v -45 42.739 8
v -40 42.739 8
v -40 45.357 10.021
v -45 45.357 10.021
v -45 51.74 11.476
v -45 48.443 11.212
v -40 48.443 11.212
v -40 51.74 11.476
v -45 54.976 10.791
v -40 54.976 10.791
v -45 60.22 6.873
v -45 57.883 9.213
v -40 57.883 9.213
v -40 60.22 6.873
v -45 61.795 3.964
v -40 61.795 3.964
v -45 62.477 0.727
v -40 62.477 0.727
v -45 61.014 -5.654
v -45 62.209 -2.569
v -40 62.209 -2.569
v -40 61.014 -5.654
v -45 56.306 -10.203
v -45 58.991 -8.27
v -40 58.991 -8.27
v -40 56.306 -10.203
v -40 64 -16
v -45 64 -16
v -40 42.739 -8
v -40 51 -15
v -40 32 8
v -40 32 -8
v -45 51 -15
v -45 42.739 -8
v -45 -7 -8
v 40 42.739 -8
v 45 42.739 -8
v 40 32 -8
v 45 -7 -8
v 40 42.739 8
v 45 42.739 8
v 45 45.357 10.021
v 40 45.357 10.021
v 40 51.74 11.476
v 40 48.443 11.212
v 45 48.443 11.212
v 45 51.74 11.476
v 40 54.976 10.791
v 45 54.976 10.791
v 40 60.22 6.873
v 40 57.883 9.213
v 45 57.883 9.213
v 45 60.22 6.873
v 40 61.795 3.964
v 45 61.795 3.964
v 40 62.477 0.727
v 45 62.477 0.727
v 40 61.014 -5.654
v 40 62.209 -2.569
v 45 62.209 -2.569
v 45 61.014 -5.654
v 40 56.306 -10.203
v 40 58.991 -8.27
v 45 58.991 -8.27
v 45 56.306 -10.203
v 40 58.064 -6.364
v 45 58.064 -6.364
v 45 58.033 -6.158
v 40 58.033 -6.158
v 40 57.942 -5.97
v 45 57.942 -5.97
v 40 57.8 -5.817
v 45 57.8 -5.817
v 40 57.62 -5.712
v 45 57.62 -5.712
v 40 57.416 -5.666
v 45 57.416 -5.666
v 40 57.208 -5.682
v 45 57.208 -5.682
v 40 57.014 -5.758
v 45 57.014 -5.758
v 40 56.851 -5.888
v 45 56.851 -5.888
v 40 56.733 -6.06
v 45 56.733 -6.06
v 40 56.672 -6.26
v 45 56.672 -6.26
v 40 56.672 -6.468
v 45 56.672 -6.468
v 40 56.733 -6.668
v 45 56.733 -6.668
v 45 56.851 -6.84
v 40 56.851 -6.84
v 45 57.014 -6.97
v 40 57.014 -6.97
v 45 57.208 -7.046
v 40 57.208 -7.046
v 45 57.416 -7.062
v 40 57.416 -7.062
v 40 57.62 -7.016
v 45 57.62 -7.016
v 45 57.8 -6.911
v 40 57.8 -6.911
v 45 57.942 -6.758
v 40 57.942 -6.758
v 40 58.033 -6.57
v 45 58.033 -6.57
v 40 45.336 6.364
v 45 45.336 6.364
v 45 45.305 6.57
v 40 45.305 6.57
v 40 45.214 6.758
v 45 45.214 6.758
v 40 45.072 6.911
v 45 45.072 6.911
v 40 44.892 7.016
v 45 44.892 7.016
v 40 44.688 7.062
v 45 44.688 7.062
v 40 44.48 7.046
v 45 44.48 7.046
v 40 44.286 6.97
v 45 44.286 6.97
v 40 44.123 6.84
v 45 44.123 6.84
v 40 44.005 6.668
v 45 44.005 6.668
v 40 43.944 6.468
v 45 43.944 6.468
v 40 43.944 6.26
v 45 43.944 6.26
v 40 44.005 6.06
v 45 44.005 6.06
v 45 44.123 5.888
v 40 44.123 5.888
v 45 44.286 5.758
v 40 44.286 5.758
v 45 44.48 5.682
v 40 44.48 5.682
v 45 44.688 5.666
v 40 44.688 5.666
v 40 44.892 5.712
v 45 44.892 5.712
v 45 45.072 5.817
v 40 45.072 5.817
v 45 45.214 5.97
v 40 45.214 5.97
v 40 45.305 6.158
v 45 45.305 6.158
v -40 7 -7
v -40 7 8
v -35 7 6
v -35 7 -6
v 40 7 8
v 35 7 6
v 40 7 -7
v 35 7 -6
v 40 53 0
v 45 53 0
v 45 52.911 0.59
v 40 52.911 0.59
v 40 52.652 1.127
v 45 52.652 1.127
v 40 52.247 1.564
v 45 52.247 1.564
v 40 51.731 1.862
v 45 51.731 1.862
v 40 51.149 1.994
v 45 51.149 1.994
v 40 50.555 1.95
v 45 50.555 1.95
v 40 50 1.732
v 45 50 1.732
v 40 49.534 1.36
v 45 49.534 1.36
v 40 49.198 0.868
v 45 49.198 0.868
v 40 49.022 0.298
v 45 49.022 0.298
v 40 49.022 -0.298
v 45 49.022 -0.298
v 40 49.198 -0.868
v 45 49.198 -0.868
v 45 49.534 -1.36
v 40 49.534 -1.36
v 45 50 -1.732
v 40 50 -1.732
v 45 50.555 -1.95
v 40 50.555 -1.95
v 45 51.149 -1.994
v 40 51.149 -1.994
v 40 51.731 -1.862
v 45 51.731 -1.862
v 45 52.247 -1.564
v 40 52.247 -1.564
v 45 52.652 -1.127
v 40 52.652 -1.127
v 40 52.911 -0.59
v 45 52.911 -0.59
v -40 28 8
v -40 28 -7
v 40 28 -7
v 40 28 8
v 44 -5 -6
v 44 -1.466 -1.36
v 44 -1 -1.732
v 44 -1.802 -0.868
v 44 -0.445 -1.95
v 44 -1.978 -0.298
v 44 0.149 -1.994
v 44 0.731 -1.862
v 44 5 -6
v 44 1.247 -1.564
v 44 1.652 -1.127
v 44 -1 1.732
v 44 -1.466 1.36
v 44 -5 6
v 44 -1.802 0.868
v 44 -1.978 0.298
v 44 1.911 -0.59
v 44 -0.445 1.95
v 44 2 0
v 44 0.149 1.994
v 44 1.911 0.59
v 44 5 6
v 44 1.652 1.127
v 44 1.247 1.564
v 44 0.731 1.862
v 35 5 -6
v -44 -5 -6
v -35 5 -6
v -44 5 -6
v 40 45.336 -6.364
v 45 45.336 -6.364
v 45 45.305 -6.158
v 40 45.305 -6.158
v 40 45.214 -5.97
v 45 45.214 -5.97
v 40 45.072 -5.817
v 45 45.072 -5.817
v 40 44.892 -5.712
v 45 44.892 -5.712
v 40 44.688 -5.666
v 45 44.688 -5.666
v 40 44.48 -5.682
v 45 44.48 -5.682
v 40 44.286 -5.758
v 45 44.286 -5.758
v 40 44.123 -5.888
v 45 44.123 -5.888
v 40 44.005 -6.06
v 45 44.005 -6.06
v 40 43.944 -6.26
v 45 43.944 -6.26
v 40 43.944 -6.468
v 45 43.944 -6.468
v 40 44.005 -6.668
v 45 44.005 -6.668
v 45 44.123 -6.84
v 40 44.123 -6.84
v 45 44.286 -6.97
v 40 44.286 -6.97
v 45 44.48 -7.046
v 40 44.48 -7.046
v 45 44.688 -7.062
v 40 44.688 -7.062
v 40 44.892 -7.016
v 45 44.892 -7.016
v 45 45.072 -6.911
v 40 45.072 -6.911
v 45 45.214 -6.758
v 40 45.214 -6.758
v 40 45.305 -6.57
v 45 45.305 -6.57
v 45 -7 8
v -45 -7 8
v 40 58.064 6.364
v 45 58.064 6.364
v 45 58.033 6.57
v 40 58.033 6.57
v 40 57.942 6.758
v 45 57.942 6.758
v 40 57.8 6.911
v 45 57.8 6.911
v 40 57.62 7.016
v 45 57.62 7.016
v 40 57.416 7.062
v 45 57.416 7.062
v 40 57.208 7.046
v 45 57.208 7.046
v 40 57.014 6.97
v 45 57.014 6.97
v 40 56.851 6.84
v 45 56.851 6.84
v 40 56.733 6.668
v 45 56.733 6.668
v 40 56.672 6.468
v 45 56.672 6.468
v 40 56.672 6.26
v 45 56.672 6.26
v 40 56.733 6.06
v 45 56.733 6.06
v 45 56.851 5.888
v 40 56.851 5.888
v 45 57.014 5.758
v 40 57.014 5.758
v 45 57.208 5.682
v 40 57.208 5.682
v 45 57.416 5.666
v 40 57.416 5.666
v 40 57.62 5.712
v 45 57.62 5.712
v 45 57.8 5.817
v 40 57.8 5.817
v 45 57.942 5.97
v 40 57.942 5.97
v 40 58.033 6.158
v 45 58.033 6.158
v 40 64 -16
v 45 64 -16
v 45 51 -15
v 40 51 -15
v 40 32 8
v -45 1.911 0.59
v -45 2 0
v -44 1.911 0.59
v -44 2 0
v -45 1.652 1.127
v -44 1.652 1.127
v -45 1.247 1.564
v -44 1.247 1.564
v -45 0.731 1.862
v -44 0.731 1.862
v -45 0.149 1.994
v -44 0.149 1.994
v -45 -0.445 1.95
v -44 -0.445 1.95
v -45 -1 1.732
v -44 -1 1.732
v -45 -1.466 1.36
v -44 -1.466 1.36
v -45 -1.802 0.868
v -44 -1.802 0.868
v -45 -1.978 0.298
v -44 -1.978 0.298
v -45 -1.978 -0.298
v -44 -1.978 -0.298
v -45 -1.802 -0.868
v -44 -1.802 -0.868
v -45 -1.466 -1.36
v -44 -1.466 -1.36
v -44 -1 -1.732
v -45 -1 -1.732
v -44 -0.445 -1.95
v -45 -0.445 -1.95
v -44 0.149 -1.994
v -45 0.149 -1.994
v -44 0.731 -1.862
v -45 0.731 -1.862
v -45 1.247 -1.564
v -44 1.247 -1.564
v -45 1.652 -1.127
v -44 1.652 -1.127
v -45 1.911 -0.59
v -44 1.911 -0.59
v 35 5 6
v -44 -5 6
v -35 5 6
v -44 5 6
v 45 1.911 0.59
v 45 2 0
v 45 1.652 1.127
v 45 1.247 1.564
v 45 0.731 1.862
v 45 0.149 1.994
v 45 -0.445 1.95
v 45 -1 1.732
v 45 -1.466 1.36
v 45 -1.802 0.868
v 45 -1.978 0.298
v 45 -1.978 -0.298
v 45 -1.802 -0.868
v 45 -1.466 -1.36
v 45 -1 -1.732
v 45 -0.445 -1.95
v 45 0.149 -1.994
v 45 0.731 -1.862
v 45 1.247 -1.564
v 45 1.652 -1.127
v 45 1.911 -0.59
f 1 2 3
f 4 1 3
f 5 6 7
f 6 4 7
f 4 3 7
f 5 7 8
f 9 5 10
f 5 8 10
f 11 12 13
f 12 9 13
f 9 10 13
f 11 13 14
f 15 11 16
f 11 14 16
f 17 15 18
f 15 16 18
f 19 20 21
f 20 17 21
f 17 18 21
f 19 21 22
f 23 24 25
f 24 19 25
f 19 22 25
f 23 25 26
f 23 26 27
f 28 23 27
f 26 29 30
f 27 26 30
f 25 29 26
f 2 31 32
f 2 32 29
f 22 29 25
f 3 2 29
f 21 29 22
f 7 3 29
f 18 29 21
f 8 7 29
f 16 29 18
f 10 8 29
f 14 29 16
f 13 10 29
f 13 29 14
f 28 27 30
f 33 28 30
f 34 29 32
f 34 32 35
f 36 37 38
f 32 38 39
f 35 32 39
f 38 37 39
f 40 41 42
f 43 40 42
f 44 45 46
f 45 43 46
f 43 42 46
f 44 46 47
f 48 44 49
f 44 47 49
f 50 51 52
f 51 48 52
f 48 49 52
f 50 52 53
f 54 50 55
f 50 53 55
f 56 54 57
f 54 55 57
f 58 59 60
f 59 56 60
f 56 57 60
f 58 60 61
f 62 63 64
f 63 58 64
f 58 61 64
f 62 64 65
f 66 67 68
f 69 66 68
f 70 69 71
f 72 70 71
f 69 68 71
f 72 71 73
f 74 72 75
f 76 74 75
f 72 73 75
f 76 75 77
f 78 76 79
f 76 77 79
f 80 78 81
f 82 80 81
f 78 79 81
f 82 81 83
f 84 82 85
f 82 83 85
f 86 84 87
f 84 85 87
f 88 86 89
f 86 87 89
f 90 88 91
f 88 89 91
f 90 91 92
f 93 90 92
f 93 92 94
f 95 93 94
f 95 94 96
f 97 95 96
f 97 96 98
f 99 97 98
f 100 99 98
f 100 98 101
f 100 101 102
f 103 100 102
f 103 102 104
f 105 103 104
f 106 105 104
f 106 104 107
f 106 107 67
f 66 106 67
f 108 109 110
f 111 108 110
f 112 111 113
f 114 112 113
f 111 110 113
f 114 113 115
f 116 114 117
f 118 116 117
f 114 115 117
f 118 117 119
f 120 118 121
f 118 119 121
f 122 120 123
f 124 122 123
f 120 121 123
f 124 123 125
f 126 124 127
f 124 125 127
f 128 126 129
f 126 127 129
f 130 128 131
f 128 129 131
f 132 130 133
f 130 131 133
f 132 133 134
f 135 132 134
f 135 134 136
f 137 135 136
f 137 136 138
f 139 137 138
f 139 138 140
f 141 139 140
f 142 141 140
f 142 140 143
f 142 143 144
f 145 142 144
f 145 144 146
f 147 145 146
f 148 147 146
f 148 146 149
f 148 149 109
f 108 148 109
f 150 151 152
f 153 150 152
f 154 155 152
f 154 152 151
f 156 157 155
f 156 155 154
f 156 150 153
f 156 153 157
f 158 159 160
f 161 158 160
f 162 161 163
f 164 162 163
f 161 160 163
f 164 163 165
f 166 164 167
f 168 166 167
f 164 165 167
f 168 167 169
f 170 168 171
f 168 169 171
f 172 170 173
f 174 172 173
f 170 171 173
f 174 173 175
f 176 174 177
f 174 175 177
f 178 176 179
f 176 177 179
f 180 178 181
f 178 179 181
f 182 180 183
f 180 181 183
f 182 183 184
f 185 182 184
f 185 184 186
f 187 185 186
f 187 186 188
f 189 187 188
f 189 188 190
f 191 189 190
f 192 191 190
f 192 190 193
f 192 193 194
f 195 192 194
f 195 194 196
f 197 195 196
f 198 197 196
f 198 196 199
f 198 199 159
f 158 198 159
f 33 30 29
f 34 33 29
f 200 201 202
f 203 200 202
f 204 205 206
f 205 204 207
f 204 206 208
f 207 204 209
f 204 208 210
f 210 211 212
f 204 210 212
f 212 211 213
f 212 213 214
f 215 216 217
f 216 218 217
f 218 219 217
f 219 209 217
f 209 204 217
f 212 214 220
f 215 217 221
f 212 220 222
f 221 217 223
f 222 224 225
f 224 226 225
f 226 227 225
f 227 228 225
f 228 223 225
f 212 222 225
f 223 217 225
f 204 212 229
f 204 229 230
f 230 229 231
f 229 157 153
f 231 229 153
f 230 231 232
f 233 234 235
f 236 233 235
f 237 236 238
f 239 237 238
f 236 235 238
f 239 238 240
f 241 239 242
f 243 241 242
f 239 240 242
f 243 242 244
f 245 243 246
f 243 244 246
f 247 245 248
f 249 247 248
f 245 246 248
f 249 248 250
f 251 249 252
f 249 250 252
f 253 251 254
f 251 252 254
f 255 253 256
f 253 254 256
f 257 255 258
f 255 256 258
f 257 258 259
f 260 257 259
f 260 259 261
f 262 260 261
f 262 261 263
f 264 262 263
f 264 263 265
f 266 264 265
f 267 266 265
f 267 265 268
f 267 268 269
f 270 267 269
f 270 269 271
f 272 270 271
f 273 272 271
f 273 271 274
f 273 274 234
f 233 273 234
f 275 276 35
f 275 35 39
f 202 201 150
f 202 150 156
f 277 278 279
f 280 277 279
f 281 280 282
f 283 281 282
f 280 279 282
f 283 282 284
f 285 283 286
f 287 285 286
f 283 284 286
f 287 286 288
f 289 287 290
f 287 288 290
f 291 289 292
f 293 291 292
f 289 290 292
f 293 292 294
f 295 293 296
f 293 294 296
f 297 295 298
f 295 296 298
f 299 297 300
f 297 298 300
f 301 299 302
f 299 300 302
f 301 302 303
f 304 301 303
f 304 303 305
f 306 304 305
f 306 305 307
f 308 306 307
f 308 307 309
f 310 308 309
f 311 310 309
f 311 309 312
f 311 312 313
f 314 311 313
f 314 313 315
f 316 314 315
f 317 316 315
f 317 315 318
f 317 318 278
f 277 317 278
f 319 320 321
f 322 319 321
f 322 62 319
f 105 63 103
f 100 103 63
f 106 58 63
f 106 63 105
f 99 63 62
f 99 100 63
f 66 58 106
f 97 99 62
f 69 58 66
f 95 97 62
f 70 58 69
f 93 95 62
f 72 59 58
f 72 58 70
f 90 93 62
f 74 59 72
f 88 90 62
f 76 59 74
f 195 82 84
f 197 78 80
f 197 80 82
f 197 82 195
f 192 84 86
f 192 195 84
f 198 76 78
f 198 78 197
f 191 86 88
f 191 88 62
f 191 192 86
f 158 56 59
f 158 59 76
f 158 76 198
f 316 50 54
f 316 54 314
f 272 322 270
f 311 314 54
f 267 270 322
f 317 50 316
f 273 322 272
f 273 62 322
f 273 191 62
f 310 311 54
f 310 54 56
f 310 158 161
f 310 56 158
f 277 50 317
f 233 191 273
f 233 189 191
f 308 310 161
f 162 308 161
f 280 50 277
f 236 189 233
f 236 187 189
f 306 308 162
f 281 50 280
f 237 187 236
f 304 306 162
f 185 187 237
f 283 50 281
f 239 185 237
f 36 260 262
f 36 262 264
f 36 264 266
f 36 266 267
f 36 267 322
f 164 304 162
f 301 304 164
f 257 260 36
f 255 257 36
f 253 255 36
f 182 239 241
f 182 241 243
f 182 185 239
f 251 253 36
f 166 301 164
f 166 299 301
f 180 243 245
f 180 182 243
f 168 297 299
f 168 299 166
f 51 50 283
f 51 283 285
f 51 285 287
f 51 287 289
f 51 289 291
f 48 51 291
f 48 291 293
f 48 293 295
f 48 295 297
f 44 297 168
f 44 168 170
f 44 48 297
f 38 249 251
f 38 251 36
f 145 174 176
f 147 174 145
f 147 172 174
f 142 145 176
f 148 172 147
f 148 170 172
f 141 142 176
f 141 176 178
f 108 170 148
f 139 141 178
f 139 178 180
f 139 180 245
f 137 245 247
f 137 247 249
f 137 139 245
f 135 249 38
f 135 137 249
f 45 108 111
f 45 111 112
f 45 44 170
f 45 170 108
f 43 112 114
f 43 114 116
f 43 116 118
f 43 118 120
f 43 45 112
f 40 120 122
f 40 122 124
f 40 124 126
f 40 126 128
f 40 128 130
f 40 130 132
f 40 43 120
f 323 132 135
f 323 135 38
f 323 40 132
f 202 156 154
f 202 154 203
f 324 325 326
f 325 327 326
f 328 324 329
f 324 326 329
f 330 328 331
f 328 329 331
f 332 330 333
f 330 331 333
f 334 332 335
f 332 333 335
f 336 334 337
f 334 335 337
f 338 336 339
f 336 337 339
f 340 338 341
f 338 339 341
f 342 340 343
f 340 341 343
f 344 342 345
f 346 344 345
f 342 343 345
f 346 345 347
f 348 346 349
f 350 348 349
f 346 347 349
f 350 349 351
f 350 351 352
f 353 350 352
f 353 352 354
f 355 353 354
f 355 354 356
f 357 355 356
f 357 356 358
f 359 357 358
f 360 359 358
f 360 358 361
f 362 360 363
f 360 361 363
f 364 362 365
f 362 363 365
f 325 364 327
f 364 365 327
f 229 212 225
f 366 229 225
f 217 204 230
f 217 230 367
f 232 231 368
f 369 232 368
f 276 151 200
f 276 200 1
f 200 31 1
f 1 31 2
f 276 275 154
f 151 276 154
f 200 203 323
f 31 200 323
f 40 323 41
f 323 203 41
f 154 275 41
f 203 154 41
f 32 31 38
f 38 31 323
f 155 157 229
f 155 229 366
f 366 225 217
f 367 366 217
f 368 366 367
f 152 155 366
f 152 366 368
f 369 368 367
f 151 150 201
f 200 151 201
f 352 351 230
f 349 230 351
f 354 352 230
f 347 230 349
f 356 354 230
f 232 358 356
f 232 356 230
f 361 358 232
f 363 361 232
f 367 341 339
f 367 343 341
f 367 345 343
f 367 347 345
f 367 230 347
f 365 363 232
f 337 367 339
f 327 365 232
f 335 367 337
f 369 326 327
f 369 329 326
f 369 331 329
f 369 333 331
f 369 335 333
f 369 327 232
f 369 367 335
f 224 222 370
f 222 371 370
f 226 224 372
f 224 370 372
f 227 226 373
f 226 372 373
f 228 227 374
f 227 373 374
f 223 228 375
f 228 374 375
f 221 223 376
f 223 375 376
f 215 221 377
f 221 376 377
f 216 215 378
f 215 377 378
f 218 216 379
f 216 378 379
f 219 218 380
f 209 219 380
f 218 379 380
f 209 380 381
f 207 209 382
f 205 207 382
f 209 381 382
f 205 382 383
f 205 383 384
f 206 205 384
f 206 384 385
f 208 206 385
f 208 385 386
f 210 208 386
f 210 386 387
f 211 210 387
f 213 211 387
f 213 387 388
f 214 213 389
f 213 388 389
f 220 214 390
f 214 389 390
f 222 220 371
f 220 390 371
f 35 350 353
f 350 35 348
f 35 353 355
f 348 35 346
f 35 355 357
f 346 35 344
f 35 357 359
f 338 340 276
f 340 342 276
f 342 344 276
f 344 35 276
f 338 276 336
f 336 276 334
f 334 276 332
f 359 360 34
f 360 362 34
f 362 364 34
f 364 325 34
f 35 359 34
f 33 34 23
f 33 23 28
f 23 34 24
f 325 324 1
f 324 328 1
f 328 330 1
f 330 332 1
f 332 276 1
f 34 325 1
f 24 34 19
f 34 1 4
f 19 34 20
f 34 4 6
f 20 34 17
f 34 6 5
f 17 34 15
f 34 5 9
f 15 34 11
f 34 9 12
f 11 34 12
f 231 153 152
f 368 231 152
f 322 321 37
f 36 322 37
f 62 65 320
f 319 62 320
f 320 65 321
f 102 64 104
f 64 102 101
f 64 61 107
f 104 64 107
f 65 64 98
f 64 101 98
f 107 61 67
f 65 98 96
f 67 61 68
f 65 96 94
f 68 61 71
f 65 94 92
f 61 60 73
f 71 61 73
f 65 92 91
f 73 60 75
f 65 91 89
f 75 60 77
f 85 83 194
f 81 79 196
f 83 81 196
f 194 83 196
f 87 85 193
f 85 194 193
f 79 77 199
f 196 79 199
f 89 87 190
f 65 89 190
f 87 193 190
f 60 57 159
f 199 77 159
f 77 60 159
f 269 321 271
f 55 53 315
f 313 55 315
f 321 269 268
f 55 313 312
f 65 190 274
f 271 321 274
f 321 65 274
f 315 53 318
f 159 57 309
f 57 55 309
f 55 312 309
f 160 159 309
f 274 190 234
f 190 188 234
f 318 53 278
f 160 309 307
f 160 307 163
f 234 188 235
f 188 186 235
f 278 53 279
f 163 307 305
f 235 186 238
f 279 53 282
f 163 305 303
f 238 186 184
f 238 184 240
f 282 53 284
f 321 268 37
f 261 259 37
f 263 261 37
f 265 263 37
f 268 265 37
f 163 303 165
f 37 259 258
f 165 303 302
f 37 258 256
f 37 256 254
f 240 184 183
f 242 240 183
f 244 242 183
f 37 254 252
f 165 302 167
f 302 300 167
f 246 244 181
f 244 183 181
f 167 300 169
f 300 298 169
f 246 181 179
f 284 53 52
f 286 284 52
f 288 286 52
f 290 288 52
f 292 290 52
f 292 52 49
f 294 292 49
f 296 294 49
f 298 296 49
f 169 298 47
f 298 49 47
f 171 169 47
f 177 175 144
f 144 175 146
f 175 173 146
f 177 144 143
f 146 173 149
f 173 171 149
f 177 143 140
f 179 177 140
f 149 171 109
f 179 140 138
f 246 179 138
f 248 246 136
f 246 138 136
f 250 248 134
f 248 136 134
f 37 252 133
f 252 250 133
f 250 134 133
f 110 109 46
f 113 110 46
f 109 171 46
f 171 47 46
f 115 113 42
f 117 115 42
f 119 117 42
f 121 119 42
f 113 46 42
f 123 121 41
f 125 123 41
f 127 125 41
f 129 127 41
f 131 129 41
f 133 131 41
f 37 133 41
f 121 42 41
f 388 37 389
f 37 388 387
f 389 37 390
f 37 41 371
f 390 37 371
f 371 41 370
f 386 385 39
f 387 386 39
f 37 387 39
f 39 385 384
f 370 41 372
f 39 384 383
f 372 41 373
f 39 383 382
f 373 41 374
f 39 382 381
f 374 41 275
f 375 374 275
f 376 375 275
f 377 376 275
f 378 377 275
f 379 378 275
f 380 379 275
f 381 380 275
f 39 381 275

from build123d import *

# Parameters (mm, degrees)
F0_W      = 90
F0_H      = 74
F1_DEPTH  = 8
F2_W      = 10
F2_H      = 12
F3_DEPTH  = 44
F4_W      = 80
F4_H      = 21
F5_DEPTH  = 25
F6_DEPTH  = 7
F7_W      = 70
F7_H      = 12
F8_DEPTH  = 3
F9_R      = 2
F10_DEPTH = 50
F11_W     = 80
F11_H     = 38
F12_DEPTH = 25
F13_R     = 2
F13_R_2   = 0.7
F14_DEPTH = 25
F15_W     = 5
F15_H     = 35
F16_DEPTH = 5
F17_W     = 5
F17_H     = 35
F18_DEPTH = 20
F20_DEPTH = 50


with BuildPart() as f1:
    # F0 (on Top) → F1 (new body, symmetric)
    with BuildSketch(Plane.XY):
        with Locations((0, 30)):
            Rectangle(F0_W, F0_H)
    extrude(amount=F1_DEPTH, both=True)

    # F2 (on Right) → F3 (cut, symmetric)
    with BuildSketch(Plane.YZ):
        Rectangle(F2_W, F2_H)
    extrude(amount=F3_DEPTH, both=True, mode=Mode.SUBTRACT)

    # F4 (on Top) → F5 (cut)
    with BuildSketch(Plane.XY):
        with Locations((0, 17.5)):
            Rectangle(F4_W, F4_H)
    extrude(amount=F5_DEPTH, mode=Mode.SUBTRACT)

    # F4 (on Top) → F6 (cut)
    with BuildSketch(Plane.XY):
        with Locations((0, 17.5)):
            Rectangle(F4_W, F4_H)
    extrude(amount=-F6_DEPTH, mode=Mode.SUBTRACT)

    # F7 (on face) → F8 (cut)
    with BuildSketch(Plane(origin=(0, 7, 0), x_dir=(-1, 0, 0), z_dir=(0, 1, 0))):
        Rectangle(F7_W, F7_H)
    extrude(amount=-F8_DEPTH, mode=Mode.SUBTRACT)

    # F9 (on Right) → F10 (cut, symmetric)
    with BuildSketch(Plane.YZ):
        Circle(F9_R)
    extrude(amount=F10_DEPTH, both=True, mode=Mode.SUBTRACT)

    # F11 (on face) → F12 (cut)
    with BuildSketch(Plane.XY.offset(8)):
        with Locations((0, 51)):
            Rectangle(F11_W, F11_H)
    extrude(amount=-F12_DEPTH, mode=Mode.SUBTRACT)

    # F13 (on face) → F14 (cut)
    with BuildSketch(Plane.YZ.offset(45)):
        with Locations((51, 0)):
            Circle(F13_R)
        with Locations((44.636039, 6.363961)):
            Circle(F13_R_2)
        with Locations((57.363961, 6.363961)):
            Circle(F13_R_2)
        with Locations((44.636039, -6.363961)):
            Circle(F13_R_2)
        with Locations((57.363961, -6.363961)):
            Circle(F13_R_2)
    extrude(amount=-F14_DEPTH, mode=Mode.SUBTRACT)

    # F15 (on face) → F16 (join)
    with BuildSketch(Plane.XY.offset(8)):
        with Locations((42.5, 49.5)):
            Rectangle(F15_W, F15_H)
        with Locations((-42.5, 49.5)):
            Rectangle(F15_W, F15_H)
    extrude(amount=F16_DEPTH)

    # F17 (on face) → F18 (join)
    with BuildSketch(Plane(origin=(0, 0, -8), x_dir=(1, 0, 0), z_dir=(0, 0, -1))):
        with Locations((42.5, -49.5)):
            Rectangle(F17_W, F17_H)
        with Locations((-42.5, -49.5)):
            Rectangle(F17_W, F17_H)
    extrude(amount=F18_DEPTH)

    # F19 (on Right) → F20 (cut, symmetric)
    with BuildSketch(Plane.YZ):
        with BuildLine():
            Line((56.306477, -10.202515), (64, -16))
            Line((64, -16), (51, -15))
            Line((51, -15), (42.738644, -8))
            Line((42.738644, -8), (30.108895, -8))
            Line((30.108895, -8), (30.108895, -29.582262))
            Line((30.108895, -29.582262), (71.439214, -31.000461))
            Line((71.439214, -31.000461), (73.09068, 17.127901))
            Line((73.09068, 17.127901), (30.442541, 17.835671))
            Line((30.442541, 17.835671), (30.442541, 8))
            Line((30.442541, 8), (42.738644, 8))
            ThreePointArc((42.738644, 8), (60.220396, 6.872721), (56.306477, -10.202515))
        make_face()
    extrude(amount=F20_DEPTH, both=True, mode=Mode.SUBTRACT)


solid = f1.part
